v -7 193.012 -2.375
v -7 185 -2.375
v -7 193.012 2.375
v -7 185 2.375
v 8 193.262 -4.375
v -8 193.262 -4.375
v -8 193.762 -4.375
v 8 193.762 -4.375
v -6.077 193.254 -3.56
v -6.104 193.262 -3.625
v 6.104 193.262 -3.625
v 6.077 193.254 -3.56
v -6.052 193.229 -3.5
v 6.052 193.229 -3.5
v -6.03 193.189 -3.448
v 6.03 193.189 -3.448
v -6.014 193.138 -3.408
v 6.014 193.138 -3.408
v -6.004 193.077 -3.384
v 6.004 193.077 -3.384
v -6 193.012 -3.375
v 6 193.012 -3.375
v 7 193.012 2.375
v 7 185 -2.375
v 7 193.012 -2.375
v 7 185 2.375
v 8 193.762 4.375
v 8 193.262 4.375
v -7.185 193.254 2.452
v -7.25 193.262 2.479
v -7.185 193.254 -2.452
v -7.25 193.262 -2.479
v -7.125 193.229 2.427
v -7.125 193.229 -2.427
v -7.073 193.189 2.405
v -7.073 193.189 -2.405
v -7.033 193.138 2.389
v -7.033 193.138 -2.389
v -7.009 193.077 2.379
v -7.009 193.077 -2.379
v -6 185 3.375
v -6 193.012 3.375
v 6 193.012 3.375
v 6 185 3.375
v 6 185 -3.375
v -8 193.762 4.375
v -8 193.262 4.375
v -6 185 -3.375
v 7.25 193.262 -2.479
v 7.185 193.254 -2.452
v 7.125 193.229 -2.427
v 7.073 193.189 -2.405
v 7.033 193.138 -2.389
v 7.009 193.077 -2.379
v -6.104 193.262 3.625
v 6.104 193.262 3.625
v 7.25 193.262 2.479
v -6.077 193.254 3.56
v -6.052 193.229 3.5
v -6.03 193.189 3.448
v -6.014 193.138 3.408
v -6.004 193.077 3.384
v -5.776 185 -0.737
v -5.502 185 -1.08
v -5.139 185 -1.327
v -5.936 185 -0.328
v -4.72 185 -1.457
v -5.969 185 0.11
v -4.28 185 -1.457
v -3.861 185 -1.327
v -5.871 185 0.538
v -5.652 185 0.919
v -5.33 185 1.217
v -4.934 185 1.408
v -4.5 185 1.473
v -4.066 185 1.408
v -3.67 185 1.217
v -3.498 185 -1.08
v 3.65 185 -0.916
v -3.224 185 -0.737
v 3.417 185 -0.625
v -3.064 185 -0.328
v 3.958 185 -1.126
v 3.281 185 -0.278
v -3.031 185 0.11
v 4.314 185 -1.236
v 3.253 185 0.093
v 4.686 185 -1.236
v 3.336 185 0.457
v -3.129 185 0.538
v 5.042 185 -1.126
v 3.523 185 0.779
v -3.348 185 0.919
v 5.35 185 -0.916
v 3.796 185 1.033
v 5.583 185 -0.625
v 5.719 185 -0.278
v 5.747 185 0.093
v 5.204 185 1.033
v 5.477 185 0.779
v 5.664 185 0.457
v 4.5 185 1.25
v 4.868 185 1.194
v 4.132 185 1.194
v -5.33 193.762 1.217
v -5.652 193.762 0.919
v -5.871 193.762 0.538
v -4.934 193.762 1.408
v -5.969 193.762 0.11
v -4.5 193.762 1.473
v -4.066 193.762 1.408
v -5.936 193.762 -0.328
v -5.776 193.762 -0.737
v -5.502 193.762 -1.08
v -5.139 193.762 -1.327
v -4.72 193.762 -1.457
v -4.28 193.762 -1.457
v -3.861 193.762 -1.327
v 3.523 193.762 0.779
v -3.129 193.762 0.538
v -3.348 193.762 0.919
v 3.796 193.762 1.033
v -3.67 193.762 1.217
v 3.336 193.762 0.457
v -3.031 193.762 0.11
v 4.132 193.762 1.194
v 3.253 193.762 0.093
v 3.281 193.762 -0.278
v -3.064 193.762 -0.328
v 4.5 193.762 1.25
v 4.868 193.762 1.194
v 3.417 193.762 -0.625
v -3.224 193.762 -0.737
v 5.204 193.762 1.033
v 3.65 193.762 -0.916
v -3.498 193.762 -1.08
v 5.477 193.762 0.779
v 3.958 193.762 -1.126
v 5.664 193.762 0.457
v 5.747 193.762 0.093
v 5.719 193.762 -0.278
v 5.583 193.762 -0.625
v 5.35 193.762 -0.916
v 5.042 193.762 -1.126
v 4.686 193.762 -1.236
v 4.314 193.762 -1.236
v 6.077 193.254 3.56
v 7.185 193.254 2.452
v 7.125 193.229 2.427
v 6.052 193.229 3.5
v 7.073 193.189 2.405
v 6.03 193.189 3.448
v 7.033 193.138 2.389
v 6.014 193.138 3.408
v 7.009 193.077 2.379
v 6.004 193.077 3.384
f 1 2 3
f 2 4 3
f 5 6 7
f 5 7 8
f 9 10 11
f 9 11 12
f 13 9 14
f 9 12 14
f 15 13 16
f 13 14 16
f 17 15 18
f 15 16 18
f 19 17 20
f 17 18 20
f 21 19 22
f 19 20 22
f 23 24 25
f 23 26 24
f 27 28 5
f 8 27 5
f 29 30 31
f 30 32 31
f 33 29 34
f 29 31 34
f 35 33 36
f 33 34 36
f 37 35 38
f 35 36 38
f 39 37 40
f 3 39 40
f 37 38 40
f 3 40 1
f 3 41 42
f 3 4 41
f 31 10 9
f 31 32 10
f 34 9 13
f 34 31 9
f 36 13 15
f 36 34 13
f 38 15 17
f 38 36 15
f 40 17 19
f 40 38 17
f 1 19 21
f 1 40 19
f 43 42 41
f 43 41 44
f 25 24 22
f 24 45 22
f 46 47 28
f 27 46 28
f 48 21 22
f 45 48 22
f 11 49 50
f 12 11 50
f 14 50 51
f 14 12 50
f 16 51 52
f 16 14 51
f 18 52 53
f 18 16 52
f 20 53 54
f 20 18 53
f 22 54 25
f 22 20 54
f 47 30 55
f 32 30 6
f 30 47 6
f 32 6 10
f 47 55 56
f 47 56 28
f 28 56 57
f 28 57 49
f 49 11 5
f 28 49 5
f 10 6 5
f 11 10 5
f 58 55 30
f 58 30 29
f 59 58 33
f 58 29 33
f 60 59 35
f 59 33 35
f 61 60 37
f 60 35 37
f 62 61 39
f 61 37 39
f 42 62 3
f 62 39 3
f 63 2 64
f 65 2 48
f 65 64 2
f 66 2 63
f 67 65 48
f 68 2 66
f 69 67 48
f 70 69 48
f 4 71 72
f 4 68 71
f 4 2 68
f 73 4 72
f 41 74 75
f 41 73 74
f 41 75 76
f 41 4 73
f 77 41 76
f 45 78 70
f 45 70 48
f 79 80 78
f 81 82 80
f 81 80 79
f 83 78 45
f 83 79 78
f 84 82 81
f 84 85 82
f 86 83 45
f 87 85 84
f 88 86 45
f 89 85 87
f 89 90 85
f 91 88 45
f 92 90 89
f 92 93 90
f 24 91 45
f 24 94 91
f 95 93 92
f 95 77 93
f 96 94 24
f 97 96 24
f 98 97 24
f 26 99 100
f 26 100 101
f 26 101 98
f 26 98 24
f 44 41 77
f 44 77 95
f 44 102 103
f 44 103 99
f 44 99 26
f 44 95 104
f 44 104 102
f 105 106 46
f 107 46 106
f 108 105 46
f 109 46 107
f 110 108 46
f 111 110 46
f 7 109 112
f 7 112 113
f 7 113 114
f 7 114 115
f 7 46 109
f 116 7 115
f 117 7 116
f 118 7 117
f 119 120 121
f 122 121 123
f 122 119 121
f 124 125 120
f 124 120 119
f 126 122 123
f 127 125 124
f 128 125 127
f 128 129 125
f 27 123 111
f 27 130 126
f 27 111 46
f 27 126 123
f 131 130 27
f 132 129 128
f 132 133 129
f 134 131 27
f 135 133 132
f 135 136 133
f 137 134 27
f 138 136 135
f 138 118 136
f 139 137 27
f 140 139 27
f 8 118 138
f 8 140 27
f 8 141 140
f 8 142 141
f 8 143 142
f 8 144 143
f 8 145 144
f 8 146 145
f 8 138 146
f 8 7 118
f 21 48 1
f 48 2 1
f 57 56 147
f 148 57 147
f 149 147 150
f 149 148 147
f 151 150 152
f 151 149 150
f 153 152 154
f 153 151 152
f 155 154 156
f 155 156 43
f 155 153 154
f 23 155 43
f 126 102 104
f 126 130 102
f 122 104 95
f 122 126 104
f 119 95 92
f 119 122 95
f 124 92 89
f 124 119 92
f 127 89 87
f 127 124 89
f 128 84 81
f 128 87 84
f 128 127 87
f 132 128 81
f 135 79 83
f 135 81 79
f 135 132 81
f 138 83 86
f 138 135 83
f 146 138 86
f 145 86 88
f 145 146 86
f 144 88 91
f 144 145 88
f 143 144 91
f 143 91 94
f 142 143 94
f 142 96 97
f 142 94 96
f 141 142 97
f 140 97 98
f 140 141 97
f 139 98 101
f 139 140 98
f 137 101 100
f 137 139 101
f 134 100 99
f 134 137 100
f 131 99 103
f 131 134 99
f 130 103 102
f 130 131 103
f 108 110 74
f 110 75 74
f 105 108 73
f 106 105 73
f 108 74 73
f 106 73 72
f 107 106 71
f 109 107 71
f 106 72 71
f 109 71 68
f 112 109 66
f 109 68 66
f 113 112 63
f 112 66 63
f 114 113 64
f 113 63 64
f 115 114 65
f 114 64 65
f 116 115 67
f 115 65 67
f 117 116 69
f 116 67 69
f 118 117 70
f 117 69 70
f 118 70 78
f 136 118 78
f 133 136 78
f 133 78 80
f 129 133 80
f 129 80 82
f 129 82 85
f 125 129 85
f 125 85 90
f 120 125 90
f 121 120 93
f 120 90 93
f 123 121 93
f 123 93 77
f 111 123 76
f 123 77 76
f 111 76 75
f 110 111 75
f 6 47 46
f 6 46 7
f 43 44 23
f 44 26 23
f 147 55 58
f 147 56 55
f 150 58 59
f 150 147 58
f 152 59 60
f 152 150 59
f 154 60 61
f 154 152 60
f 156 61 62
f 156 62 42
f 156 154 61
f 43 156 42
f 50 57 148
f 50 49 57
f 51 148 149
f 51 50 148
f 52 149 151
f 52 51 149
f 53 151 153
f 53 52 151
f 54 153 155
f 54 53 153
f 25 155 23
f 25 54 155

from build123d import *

# Parameters (mm, degrees)
SKETCH1_W      = 14
SKETCH1_H      = 8.2625
EXTRUDE1_DEPTH = 3.375
SKETCH4_W      = 16
SKETCH4_H      = 8.75
EXTRUDE2_DEPTH = 0.5
SKETCH2_W      = 1.4732
SKETCH2_H      = 14.507045303
SKETCH3_W      = 1.25
SKETCH3_H      = 20
CHAMFER1_SIZE  = 1
FILLET1_R      = 0.25


with BuildPart() as part:
    # Sketch1 → Extrude1 (new body, symmetric)
    with BuildSketch(Plane.XY):
        with Locations((0, 189.13125)):
            Rectangle(SKETCH1_W, SKETCH1_H)
    extrude(amount=EXTRUDE1_DEPTH, both=True)

    # Sketch4 → Extrude2 (add)
    with BuildSketch(Plane(origin=(0, 193.2625, 0), x_dir=(1, 0, 0), z_dir=(0, 1, 0))):
        Rectangle(SKETCH4_W, SKETCH4_H)
    extrude(amount=EXTRUDE2_DEPTH)

    # Sketch2 → Cut-Revolve1 (revolve, cut)
    with BuildSketch(Plane(origin=(9.451328919, 219.930638069, 0), x_dir=(1, 0, 0), z_dir=(0, 0, -1)), mode=Mode.PRIVATE) as cut_revolve1_sk:
        with Locations((-13.214728919, 31.182818604)):
            Rectangle(SKETCH2_W, SKETCH2_H)
    revolve(cut_revolve1_sk.sketch.rotate(Axis((-4.5, 202.803113019, 0), (0, -1, 0)), 90), axis=Axis((-4.5, 202.803113019, 0), (0, -1, 0)), mode=Mode.SUBTRACT)  # turned: the seam where the file's is

    # Sketch3 → Cut-Revolve2 (revolve, cut)
    with BuildSketch(Plane.XY, mode=Mode.PRIVATE) as cut_revolve2_sk:
        with Locations((5.125, 186.074655067)):
            Rectangle(SKETCH3_W, SKETCH3_H)
    revolve(cut_revolve2_sk.sketch.rotate(Axis((4.5, 219.496854939, 0), (0, -1, 0)), 90), axis=Axis((4.5, 219.496854939, 0), (0, -1, 0)), mode=Mode.SUBTRACT)  # turned: the seam where the file's is

    # Chamfer1
    chamfer1_edges = [part.edges().sort_by_distance(p)[0] for p in [
        (7, 189.13125, 3.375),
        (-7, 189.13125, 3.375),
        (7, 189.13125, -3.375),
        (-7, 189.13125, -3.375),
    ]]
    chamfer(chamfer1_edges, length=CHAMFER1_SIZE)

    # Fillet1
    fillet1_edges = [part.edges().sort_by_distance(p)[0] for p in [
        (-7, 193.2625, 0),
        (0, 193.2625, -3.375),
        (7, 193.2625, 0),
        (0, 193.2625, 3.375),
        (-6.5, 193.2625, -2.875),
        (6.5, 193.2625, -2.875),
        (6.5, 193.2625, 2.875),
        (-6.5, 193.2625, 2.875),
    ]]
    fillet(fillet1_edges, radius=FILLET1_R)


solid = part.part
